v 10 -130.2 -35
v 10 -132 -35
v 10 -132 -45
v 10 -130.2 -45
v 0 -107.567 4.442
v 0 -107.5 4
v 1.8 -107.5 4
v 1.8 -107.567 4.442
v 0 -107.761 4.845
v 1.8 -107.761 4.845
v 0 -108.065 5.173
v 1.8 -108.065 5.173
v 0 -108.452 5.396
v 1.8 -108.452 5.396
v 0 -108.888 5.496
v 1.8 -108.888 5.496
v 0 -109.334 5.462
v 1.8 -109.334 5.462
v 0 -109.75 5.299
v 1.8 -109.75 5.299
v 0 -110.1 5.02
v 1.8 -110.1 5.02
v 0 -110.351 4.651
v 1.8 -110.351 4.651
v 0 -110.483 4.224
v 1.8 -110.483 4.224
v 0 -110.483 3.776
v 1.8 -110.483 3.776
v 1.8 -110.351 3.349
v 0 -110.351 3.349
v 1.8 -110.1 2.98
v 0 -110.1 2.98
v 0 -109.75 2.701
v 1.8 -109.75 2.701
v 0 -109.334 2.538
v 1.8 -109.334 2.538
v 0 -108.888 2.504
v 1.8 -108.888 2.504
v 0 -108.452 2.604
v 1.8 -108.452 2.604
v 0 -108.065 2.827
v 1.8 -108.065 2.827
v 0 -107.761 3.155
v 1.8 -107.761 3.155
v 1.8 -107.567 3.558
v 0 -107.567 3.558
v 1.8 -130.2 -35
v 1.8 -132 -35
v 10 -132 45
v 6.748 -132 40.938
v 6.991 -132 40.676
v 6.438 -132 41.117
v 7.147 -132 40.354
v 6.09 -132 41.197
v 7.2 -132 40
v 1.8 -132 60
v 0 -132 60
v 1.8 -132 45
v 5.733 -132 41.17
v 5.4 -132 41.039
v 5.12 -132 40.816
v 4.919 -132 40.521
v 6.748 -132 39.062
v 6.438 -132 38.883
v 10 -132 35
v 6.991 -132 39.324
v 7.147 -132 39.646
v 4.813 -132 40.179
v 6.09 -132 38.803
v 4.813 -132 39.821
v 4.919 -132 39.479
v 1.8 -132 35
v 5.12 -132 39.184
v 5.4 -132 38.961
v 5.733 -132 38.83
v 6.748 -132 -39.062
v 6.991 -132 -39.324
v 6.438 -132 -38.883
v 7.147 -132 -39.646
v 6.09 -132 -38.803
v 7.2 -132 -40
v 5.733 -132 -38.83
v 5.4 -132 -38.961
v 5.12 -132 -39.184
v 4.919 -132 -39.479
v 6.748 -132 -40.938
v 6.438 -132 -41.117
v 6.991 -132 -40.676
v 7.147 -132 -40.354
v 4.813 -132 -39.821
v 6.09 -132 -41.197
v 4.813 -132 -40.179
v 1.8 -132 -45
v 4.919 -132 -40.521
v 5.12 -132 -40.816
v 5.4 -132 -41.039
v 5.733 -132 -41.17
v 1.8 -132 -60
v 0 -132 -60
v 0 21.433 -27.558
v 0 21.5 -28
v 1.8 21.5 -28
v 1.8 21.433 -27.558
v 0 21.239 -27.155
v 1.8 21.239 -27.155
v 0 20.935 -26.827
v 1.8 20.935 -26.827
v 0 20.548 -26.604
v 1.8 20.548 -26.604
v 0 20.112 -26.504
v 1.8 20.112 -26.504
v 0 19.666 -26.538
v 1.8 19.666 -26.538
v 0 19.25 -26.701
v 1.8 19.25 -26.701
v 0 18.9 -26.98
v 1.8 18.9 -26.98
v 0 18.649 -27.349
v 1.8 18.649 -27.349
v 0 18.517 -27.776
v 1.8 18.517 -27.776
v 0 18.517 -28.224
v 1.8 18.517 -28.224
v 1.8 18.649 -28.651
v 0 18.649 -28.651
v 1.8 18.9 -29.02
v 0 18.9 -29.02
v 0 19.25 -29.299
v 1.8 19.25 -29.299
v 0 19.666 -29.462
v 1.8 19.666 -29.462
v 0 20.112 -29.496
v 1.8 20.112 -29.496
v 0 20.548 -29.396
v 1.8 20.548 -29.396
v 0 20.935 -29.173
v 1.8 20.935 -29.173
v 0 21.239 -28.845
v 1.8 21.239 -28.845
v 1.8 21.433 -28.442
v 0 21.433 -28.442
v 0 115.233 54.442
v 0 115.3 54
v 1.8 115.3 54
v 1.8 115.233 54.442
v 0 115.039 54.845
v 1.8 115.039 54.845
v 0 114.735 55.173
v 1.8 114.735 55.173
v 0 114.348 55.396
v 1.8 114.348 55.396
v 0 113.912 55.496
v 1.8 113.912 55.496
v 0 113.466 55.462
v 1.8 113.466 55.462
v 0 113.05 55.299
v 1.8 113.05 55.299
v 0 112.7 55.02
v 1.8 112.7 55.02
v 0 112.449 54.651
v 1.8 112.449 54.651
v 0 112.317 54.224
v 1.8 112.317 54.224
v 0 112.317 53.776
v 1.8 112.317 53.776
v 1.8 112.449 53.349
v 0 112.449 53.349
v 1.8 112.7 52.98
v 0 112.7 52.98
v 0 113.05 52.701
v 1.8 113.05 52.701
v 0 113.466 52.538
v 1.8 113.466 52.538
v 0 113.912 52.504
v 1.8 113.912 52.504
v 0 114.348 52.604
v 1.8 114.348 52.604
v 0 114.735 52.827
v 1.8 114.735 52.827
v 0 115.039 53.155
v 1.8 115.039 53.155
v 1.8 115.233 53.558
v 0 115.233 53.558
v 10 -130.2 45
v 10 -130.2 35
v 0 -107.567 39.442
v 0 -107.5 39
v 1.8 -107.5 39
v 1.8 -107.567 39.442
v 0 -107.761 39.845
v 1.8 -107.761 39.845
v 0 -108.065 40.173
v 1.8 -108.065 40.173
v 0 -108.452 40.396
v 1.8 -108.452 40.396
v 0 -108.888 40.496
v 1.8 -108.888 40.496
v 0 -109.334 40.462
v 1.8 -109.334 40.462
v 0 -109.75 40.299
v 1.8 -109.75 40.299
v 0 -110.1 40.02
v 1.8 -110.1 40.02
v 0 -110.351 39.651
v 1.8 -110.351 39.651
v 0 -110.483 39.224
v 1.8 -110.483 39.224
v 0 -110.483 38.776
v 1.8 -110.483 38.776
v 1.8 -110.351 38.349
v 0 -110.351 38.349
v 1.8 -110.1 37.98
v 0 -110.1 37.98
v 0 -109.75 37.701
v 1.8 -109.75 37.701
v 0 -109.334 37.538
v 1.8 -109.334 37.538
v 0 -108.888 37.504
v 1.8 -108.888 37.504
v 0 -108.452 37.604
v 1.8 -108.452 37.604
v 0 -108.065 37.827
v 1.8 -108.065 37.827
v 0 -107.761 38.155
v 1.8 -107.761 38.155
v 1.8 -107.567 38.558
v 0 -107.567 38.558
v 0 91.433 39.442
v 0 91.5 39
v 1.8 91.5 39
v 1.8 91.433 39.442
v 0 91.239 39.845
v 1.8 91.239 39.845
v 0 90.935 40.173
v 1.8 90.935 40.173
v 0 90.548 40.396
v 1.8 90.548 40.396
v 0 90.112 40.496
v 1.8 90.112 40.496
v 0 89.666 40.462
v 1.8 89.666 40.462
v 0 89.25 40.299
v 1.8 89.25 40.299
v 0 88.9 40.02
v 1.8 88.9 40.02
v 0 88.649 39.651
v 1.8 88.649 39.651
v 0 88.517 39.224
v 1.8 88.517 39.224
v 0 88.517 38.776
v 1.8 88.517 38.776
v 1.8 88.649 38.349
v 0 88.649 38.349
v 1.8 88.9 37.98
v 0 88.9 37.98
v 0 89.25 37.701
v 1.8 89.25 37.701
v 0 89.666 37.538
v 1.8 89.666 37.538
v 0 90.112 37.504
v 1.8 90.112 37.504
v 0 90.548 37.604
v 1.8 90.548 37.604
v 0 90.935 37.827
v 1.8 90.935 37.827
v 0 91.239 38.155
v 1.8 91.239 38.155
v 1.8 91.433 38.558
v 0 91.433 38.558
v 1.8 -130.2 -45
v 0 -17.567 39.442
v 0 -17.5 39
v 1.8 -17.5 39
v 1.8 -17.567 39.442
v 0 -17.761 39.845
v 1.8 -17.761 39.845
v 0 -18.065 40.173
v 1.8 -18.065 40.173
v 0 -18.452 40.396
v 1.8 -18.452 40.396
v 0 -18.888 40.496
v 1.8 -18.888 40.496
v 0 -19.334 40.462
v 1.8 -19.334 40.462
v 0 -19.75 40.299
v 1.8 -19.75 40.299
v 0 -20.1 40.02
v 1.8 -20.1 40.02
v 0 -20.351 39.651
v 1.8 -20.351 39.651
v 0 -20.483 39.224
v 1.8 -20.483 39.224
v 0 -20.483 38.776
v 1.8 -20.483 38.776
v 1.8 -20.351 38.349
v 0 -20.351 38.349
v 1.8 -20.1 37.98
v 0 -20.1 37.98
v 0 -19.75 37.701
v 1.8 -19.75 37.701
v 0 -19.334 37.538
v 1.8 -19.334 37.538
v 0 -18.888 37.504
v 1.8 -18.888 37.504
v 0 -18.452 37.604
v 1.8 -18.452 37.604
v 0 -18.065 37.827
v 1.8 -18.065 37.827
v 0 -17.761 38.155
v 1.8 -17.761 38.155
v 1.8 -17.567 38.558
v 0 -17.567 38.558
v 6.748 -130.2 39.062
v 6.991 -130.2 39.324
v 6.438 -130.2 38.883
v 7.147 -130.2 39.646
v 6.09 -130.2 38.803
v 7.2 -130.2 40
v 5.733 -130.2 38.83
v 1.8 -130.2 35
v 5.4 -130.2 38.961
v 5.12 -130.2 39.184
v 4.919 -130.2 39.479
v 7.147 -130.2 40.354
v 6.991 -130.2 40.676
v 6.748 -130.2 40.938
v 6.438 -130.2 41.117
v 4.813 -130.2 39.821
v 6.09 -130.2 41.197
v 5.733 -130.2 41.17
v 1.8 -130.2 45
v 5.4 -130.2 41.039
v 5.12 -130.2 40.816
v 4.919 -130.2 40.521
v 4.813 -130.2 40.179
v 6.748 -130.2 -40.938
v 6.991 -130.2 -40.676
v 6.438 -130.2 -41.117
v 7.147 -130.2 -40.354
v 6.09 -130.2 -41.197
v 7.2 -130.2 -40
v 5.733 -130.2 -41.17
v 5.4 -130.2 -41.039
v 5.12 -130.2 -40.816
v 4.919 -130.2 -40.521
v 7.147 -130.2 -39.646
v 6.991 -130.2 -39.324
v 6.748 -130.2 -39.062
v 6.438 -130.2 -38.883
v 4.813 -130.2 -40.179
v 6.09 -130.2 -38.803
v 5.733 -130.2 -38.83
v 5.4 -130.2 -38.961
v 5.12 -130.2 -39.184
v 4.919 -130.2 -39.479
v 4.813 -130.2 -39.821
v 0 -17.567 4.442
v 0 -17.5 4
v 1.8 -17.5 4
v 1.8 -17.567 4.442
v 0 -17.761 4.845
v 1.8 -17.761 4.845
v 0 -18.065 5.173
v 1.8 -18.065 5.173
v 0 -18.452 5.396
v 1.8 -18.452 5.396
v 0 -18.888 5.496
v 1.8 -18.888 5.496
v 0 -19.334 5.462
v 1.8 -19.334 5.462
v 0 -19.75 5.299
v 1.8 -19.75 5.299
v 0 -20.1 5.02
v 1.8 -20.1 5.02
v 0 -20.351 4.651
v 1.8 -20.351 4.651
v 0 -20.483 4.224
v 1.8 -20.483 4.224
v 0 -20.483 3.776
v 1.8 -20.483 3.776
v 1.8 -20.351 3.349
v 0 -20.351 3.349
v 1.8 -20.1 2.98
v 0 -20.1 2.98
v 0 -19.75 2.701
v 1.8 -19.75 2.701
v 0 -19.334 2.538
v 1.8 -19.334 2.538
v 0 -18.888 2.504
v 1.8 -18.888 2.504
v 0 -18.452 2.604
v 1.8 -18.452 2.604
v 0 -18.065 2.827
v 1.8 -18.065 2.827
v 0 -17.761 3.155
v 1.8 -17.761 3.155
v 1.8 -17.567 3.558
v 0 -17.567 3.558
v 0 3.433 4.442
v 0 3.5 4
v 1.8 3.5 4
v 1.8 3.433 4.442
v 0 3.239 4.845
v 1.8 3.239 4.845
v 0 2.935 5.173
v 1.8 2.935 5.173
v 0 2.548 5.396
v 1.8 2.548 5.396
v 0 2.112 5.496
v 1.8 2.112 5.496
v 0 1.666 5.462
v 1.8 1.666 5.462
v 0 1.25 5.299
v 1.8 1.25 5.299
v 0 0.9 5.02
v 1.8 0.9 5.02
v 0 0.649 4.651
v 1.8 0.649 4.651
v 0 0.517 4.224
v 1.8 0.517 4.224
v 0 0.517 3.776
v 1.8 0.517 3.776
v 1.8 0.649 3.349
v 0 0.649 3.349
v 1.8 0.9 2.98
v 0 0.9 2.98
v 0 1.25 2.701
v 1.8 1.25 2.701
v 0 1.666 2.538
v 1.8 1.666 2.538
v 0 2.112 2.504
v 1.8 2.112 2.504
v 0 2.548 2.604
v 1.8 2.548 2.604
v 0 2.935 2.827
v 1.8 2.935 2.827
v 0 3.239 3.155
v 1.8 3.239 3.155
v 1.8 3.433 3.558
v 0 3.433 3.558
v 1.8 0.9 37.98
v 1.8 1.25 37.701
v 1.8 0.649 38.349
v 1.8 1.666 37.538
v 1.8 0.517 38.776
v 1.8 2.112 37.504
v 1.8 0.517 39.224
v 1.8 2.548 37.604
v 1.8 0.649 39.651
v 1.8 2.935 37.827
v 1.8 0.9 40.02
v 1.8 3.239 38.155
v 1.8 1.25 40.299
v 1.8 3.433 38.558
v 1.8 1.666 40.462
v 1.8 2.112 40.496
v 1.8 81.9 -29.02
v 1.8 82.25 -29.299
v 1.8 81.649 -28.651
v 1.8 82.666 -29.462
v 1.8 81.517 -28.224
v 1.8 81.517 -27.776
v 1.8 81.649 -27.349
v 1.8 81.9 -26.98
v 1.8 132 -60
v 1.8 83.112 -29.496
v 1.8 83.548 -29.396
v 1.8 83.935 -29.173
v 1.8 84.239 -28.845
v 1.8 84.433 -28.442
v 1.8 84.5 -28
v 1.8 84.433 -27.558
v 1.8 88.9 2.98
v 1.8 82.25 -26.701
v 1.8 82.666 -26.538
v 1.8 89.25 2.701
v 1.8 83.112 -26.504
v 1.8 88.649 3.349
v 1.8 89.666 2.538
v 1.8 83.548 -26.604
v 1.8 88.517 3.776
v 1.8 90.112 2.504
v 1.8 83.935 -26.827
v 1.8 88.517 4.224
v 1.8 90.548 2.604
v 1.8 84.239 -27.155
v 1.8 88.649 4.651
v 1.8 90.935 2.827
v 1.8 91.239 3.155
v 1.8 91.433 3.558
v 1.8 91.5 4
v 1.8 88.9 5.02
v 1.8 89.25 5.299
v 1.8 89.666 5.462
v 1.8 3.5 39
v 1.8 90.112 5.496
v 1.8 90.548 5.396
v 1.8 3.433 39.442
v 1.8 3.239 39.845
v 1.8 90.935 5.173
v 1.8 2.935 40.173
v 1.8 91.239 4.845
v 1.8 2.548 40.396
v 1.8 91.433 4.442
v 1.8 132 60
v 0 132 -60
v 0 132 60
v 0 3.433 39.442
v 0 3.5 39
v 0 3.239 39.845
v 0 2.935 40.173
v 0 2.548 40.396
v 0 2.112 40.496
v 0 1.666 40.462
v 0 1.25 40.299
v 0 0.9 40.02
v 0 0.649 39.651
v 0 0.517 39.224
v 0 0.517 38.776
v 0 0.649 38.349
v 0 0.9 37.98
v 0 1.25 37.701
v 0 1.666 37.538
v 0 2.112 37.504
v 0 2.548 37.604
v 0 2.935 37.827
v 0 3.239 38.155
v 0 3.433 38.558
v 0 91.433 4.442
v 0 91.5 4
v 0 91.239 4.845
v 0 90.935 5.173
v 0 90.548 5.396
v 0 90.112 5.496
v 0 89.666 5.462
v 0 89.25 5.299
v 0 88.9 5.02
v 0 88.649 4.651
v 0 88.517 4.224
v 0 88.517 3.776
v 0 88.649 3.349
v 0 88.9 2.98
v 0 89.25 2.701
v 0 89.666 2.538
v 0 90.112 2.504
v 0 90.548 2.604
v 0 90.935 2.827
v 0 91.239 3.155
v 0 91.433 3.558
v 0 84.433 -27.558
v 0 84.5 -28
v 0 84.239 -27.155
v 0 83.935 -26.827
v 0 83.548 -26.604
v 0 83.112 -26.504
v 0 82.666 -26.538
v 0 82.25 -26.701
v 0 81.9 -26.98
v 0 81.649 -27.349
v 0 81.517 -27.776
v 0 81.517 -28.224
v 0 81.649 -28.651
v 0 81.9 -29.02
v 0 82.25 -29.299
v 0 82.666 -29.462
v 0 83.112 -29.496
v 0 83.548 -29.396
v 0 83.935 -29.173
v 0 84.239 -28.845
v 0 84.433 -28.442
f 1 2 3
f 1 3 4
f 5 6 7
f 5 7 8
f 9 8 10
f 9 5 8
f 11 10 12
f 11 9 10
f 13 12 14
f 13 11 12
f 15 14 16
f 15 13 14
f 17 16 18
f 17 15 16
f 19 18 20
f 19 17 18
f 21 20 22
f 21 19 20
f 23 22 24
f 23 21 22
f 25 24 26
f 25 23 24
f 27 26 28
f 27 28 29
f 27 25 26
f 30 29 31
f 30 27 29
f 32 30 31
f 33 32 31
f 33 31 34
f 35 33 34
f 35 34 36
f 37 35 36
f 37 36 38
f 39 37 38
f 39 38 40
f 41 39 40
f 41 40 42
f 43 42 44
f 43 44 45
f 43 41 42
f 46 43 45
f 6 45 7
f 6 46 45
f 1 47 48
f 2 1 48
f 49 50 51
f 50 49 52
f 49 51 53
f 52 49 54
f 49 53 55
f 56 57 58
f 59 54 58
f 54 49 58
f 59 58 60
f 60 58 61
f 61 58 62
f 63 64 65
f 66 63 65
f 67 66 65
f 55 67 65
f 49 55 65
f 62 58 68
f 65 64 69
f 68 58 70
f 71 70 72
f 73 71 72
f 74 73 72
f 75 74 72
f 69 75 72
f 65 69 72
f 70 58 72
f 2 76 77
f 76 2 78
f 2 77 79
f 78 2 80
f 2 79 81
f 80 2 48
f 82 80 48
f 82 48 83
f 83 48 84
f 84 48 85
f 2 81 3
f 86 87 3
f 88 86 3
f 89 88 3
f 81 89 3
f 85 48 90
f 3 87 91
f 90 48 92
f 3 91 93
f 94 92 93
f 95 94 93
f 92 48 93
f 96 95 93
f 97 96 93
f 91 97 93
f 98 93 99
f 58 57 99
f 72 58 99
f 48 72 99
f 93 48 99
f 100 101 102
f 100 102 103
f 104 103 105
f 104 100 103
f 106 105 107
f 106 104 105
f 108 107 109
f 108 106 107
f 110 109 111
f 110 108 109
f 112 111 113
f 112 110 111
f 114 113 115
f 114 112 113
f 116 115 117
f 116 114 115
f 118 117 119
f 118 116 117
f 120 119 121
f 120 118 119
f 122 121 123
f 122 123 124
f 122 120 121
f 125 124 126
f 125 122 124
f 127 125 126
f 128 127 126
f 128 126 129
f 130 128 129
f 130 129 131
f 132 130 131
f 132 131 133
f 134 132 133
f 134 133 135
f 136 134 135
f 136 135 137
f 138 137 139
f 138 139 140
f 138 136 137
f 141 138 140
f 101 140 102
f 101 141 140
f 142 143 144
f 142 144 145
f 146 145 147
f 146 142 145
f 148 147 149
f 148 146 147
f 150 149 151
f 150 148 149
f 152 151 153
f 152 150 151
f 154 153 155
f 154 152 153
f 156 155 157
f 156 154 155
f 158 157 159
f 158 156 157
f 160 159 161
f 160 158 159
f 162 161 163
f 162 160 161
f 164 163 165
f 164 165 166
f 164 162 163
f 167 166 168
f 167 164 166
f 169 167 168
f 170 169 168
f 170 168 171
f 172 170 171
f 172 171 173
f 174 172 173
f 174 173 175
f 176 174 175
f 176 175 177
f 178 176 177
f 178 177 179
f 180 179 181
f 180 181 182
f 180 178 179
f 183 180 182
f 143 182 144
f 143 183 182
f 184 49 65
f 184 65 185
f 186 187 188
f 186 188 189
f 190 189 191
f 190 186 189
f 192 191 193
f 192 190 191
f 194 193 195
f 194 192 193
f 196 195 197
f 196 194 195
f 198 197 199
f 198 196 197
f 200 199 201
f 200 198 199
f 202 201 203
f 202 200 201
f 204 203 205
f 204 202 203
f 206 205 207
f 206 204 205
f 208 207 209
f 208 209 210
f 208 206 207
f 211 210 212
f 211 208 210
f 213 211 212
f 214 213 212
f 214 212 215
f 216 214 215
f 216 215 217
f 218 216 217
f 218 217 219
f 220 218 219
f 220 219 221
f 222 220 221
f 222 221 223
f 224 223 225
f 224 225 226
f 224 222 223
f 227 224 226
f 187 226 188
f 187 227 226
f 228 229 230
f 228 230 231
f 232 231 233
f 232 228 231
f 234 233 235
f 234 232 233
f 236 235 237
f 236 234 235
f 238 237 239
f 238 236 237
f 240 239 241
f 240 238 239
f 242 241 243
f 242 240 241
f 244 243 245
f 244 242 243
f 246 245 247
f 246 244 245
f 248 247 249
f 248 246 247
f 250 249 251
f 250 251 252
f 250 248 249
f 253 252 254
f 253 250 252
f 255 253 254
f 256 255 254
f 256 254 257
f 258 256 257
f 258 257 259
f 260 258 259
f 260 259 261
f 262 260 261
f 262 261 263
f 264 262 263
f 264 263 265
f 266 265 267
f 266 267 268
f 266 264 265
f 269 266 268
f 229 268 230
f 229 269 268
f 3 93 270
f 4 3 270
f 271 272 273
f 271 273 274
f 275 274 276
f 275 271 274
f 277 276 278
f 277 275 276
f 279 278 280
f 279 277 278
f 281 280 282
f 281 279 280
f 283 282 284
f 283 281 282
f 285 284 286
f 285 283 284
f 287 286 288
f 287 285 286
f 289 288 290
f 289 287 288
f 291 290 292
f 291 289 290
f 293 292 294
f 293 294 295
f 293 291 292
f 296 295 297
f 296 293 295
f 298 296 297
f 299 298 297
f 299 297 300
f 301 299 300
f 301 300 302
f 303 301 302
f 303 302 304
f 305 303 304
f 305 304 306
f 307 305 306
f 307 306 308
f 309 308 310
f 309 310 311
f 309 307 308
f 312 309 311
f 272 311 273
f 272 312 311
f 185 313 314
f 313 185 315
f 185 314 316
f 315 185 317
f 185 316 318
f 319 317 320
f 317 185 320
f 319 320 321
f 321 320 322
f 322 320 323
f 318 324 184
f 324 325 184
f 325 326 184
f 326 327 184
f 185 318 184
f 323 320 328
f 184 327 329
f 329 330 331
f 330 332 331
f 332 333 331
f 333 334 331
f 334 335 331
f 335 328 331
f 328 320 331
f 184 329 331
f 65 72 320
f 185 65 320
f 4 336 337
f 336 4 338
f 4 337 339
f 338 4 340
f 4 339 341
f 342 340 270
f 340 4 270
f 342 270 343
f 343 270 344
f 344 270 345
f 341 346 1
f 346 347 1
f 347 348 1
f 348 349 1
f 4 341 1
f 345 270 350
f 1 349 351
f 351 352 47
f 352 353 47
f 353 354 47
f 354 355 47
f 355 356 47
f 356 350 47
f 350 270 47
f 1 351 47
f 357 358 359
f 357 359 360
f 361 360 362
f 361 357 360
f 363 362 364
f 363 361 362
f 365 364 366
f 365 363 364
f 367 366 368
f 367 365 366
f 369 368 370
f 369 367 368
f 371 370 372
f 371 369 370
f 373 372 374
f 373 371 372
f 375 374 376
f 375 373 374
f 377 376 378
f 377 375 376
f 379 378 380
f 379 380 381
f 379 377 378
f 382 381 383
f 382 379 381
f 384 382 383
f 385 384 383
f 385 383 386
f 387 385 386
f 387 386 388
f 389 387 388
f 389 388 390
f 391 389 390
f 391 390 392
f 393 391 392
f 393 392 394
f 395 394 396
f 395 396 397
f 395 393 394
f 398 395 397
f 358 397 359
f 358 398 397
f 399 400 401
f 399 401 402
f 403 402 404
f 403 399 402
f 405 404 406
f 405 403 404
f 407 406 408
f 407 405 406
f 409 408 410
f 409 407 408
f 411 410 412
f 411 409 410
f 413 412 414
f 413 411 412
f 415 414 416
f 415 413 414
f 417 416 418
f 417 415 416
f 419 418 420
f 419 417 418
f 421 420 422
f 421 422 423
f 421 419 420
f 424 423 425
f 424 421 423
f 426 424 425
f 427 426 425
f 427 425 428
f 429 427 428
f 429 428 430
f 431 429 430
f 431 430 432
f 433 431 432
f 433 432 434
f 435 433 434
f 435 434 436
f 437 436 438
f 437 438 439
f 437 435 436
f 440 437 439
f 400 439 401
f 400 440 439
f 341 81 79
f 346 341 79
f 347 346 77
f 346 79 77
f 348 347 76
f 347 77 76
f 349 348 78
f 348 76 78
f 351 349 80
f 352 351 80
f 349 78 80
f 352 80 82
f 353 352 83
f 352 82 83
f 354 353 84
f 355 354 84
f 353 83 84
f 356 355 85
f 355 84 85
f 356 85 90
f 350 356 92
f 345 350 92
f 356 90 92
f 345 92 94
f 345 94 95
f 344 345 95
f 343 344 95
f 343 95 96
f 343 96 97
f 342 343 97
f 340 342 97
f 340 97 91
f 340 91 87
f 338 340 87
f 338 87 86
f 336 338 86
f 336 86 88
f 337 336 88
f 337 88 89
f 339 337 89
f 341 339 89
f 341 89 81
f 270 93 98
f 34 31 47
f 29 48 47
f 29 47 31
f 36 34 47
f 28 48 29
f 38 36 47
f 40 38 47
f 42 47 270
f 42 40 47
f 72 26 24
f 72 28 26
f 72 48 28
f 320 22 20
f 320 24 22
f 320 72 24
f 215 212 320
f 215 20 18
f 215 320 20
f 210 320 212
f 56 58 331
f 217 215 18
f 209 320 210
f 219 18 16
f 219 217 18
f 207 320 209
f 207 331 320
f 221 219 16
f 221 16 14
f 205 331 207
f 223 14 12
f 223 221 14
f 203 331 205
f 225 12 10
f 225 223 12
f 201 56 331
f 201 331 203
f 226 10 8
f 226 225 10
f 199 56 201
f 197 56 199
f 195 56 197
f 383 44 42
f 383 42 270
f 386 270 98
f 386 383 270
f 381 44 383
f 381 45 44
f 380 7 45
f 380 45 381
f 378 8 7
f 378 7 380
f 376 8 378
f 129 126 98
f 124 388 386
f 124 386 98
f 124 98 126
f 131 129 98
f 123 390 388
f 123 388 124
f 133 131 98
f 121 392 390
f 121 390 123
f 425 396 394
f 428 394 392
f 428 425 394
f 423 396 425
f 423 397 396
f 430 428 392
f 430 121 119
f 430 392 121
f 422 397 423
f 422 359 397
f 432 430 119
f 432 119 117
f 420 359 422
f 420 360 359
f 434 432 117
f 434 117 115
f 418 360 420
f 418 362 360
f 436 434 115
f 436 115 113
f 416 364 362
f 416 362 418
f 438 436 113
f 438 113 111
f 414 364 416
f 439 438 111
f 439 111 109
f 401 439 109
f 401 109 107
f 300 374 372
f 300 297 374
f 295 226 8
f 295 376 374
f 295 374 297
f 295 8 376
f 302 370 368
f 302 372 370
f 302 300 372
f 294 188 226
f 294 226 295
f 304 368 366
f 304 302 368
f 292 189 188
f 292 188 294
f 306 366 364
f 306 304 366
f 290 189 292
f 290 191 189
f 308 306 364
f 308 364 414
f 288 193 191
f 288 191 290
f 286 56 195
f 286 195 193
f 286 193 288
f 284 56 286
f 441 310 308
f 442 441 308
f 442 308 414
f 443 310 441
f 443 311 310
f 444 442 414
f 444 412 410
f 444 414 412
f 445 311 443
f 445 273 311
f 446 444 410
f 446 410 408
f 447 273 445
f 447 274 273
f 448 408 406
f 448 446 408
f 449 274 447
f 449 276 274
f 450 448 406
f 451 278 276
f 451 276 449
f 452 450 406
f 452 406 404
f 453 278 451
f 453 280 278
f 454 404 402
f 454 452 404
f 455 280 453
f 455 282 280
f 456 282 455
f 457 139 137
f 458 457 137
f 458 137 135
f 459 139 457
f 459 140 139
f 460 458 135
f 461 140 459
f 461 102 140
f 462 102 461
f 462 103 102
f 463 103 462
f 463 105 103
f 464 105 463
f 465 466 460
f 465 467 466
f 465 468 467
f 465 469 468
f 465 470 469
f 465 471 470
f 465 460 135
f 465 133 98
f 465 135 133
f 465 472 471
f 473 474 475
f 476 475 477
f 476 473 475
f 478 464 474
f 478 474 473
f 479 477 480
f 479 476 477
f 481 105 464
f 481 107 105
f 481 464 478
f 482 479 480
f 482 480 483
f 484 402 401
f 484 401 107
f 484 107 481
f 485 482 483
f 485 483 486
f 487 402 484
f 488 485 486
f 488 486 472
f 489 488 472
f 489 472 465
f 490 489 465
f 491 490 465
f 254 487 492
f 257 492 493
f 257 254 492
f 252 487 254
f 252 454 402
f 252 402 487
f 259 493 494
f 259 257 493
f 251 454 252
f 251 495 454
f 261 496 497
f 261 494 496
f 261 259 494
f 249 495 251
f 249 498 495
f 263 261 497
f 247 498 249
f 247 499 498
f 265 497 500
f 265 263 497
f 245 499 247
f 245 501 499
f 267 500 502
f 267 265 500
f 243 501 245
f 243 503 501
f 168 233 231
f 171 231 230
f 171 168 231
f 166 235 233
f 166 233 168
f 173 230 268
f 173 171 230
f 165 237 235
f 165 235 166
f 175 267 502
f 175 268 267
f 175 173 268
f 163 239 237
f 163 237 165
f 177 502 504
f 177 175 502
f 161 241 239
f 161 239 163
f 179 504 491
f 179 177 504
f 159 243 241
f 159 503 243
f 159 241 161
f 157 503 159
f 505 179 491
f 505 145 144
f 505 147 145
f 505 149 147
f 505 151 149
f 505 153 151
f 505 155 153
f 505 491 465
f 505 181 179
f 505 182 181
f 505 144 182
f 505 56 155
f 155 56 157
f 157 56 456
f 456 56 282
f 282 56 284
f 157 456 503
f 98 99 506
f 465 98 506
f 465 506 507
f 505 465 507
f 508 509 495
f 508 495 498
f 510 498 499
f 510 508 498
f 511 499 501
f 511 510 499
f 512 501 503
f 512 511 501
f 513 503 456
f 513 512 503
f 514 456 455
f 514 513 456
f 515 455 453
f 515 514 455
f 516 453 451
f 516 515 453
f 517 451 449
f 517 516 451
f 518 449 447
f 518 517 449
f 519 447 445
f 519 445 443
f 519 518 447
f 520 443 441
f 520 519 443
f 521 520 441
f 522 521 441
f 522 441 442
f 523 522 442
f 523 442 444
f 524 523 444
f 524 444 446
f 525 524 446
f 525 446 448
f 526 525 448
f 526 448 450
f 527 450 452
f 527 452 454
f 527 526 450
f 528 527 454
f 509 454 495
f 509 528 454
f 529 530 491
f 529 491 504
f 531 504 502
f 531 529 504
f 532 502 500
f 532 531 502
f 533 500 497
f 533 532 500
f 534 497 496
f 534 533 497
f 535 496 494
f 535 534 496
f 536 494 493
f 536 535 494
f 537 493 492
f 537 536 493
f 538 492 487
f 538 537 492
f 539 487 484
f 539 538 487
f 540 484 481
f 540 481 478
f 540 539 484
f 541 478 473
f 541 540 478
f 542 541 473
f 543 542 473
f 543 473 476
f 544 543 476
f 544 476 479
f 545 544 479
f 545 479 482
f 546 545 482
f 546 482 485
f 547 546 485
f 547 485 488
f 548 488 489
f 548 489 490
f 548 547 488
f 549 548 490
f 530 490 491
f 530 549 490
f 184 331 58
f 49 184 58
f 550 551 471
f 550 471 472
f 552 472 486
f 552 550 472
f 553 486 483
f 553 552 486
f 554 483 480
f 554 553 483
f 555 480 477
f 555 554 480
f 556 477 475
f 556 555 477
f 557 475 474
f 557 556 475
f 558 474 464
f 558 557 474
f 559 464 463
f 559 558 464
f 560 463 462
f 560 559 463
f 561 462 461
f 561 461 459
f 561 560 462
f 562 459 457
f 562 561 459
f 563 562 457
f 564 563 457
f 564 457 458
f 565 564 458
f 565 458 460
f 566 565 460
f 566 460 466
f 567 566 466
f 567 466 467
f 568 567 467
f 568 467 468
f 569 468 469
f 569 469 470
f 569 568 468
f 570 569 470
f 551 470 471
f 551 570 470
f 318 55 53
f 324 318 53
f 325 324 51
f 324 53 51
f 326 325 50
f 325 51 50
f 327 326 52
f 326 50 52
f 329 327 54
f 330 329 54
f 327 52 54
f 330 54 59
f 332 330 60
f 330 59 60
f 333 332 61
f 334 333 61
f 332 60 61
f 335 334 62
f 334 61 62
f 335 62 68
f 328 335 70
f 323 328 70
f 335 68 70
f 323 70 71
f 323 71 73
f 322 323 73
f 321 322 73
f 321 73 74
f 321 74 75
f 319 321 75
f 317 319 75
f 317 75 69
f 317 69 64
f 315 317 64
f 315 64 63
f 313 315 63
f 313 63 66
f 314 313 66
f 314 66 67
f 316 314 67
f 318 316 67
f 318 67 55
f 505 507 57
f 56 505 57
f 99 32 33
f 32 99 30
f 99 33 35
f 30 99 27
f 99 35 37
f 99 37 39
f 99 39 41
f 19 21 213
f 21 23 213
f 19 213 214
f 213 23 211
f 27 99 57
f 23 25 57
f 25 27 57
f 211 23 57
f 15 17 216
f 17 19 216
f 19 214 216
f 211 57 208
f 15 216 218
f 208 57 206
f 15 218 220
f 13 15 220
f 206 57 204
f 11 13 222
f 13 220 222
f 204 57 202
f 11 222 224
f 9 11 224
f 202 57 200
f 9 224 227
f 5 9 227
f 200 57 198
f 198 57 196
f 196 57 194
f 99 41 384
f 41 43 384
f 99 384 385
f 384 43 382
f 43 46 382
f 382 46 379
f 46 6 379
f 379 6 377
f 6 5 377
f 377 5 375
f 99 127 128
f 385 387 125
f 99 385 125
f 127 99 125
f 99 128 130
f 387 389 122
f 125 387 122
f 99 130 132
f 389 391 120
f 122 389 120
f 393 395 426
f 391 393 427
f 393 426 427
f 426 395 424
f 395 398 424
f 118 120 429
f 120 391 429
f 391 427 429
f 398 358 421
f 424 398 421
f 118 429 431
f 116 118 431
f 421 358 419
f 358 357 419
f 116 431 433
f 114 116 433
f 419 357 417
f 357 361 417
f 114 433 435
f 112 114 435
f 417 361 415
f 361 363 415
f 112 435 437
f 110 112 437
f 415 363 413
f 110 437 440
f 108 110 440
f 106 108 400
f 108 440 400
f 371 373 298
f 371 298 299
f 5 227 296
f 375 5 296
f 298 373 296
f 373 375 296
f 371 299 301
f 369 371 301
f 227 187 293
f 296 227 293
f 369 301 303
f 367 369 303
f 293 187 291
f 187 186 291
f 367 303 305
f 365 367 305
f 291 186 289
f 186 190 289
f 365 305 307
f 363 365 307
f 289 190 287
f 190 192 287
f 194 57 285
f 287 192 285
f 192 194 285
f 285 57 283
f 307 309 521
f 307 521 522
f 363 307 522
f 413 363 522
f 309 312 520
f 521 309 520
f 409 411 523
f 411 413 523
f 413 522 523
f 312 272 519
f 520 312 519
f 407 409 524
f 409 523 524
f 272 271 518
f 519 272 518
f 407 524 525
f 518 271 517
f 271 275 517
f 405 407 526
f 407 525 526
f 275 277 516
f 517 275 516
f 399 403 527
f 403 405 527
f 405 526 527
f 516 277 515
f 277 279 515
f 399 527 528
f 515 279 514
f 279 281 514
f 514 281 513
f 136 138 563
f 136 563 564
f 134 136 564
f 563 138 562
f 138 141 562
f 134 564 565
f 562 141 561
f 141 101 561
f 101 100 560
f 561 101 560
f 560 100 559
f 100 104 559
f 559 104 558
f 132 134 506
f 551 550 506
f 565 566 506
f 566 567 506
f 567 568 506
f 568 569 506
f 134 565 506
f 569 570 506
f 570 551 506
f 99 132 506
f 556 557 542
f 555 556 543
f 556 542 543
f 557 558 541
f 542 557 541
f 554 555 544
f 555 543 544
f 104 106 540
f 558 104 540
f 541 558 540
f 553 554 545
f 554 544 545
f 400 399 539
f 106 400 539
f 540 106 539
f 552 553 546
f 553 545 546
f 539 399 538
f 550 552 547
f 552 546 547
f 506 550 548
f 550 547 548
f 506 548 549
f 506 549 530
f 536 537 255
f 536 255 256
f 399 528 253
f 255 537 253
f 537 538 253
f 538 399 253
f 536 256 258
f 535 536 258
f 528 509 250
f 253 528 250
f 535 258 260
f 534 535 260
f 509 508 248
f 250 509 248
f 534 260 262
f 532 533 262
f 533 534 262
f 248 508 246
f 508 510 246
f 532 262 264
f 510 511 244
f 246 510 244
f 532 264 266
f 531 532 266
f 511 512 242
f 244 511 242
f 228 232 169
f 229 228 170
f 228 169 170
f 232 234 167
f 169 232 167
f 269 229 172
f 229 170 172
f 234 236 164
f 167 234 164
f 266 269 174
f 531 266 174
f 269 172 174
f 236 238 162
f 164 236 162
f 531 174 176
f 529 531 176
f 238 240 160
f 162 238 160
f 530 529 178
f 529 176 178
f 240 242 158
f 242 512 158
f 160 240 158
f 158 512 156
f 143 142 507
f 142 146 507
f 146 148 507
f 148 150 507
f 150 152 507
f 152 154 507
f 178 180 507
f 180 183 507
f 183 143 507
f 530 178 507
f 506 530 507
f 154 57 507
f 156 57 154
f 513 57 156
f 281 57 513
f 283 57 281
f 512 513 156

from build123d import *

# Parameters (mm, degrees)
F0_R     = 1.5
F1_DEPTH = 1.8
F2_DEPTH = 10
F3_R     = 1.2
F4_DEPTH = 264.001


with BuildPart() as f1:
    # F0 (on Right) → F1 (new body)
    with BuildSketch(Plane.YZ):
        Polygon((-132, -60), (132, -60), (132, 60), (-132, 60), (-132, 45), (-130.2, 45), (-130.2, 40), (-130.2, 35), (-132, 35), (-132, -35), (-130.2, -35), (-130.2, -40), (-130.2, -45), (-132, -45), align=None)
        with Locations((20, -28)):
            Circle(F0_R, mode=Mode.SUBTRACT)
        with Locations((83, -28)):
            Circle(F0_R, mode=Mode.SUBTRACT)
        with Locations((-109, 4)):
            Circle(F0_R, mode=Mode.SUBTRACT)
        with Locations((-19, 4)):
            Circle(F0_R, mode=Mode.SUBTRACT)
        with Locations((-109, 39)):
            Circle(F0_R, mode=Mode.SUBTRACT)
        with Locations((-19, 39)):
            Circle(F0_R, mode=Mode.SUBTRACT)
        with Locations((2, 4)):
            Circle(F0_R, mode=Mode.SUBTRACT)
        with Locations((90, 4)):
            Circle(F0_R, mode=Mode.SUBTRACT)
        with Locations((2, 39)):
            Circle(F0_R, mode=Mode.SUBTRACT)
        with Locations((90, 39)):
            Circle(F0_R, mode=Mode.SUBTRACT)
        with Locations((113.8, 54)):
            Circle(F0_R, mode=Mode.SUBTRACT)
        Polygon((-130.2, 45), (-132, 45), (-132, 35), (-130.2, 35), (-130.2, 40), align=None)
        Polygon((-132, -35), (-132, -45), (-130.2, -45), (-130.2, -40), (-130.2, -35), align=None)
    extrude(amount=F1_DEPTH)

    # F0 (on Right) → F2 (join)
    with BuildSketch(Plane.YZ):
        Polygon((-130.2, 45), (-132, 45), (-132, 35), (-130.2, 35), (-130.2, 40), align=None)
        Polygon((-132, -35), (-132, -45), (-130.2, -45), (-130.2, -40), (-130.2, -35), align=None)
    extrude(amount=F2_DEPTH)

    # F3 (on face) → F4 (cut, through all)
    with BuildSketch(Plane.XZ.offset(132)):
        with Locations((6, 40)):
            Circle(F3_R)
        with Locations((6, -40)):
            Circle(F3_R)
    extrude(amount=-F4_DEPTH, mode=Mode.SUBTRACT)


solid = f1.part
